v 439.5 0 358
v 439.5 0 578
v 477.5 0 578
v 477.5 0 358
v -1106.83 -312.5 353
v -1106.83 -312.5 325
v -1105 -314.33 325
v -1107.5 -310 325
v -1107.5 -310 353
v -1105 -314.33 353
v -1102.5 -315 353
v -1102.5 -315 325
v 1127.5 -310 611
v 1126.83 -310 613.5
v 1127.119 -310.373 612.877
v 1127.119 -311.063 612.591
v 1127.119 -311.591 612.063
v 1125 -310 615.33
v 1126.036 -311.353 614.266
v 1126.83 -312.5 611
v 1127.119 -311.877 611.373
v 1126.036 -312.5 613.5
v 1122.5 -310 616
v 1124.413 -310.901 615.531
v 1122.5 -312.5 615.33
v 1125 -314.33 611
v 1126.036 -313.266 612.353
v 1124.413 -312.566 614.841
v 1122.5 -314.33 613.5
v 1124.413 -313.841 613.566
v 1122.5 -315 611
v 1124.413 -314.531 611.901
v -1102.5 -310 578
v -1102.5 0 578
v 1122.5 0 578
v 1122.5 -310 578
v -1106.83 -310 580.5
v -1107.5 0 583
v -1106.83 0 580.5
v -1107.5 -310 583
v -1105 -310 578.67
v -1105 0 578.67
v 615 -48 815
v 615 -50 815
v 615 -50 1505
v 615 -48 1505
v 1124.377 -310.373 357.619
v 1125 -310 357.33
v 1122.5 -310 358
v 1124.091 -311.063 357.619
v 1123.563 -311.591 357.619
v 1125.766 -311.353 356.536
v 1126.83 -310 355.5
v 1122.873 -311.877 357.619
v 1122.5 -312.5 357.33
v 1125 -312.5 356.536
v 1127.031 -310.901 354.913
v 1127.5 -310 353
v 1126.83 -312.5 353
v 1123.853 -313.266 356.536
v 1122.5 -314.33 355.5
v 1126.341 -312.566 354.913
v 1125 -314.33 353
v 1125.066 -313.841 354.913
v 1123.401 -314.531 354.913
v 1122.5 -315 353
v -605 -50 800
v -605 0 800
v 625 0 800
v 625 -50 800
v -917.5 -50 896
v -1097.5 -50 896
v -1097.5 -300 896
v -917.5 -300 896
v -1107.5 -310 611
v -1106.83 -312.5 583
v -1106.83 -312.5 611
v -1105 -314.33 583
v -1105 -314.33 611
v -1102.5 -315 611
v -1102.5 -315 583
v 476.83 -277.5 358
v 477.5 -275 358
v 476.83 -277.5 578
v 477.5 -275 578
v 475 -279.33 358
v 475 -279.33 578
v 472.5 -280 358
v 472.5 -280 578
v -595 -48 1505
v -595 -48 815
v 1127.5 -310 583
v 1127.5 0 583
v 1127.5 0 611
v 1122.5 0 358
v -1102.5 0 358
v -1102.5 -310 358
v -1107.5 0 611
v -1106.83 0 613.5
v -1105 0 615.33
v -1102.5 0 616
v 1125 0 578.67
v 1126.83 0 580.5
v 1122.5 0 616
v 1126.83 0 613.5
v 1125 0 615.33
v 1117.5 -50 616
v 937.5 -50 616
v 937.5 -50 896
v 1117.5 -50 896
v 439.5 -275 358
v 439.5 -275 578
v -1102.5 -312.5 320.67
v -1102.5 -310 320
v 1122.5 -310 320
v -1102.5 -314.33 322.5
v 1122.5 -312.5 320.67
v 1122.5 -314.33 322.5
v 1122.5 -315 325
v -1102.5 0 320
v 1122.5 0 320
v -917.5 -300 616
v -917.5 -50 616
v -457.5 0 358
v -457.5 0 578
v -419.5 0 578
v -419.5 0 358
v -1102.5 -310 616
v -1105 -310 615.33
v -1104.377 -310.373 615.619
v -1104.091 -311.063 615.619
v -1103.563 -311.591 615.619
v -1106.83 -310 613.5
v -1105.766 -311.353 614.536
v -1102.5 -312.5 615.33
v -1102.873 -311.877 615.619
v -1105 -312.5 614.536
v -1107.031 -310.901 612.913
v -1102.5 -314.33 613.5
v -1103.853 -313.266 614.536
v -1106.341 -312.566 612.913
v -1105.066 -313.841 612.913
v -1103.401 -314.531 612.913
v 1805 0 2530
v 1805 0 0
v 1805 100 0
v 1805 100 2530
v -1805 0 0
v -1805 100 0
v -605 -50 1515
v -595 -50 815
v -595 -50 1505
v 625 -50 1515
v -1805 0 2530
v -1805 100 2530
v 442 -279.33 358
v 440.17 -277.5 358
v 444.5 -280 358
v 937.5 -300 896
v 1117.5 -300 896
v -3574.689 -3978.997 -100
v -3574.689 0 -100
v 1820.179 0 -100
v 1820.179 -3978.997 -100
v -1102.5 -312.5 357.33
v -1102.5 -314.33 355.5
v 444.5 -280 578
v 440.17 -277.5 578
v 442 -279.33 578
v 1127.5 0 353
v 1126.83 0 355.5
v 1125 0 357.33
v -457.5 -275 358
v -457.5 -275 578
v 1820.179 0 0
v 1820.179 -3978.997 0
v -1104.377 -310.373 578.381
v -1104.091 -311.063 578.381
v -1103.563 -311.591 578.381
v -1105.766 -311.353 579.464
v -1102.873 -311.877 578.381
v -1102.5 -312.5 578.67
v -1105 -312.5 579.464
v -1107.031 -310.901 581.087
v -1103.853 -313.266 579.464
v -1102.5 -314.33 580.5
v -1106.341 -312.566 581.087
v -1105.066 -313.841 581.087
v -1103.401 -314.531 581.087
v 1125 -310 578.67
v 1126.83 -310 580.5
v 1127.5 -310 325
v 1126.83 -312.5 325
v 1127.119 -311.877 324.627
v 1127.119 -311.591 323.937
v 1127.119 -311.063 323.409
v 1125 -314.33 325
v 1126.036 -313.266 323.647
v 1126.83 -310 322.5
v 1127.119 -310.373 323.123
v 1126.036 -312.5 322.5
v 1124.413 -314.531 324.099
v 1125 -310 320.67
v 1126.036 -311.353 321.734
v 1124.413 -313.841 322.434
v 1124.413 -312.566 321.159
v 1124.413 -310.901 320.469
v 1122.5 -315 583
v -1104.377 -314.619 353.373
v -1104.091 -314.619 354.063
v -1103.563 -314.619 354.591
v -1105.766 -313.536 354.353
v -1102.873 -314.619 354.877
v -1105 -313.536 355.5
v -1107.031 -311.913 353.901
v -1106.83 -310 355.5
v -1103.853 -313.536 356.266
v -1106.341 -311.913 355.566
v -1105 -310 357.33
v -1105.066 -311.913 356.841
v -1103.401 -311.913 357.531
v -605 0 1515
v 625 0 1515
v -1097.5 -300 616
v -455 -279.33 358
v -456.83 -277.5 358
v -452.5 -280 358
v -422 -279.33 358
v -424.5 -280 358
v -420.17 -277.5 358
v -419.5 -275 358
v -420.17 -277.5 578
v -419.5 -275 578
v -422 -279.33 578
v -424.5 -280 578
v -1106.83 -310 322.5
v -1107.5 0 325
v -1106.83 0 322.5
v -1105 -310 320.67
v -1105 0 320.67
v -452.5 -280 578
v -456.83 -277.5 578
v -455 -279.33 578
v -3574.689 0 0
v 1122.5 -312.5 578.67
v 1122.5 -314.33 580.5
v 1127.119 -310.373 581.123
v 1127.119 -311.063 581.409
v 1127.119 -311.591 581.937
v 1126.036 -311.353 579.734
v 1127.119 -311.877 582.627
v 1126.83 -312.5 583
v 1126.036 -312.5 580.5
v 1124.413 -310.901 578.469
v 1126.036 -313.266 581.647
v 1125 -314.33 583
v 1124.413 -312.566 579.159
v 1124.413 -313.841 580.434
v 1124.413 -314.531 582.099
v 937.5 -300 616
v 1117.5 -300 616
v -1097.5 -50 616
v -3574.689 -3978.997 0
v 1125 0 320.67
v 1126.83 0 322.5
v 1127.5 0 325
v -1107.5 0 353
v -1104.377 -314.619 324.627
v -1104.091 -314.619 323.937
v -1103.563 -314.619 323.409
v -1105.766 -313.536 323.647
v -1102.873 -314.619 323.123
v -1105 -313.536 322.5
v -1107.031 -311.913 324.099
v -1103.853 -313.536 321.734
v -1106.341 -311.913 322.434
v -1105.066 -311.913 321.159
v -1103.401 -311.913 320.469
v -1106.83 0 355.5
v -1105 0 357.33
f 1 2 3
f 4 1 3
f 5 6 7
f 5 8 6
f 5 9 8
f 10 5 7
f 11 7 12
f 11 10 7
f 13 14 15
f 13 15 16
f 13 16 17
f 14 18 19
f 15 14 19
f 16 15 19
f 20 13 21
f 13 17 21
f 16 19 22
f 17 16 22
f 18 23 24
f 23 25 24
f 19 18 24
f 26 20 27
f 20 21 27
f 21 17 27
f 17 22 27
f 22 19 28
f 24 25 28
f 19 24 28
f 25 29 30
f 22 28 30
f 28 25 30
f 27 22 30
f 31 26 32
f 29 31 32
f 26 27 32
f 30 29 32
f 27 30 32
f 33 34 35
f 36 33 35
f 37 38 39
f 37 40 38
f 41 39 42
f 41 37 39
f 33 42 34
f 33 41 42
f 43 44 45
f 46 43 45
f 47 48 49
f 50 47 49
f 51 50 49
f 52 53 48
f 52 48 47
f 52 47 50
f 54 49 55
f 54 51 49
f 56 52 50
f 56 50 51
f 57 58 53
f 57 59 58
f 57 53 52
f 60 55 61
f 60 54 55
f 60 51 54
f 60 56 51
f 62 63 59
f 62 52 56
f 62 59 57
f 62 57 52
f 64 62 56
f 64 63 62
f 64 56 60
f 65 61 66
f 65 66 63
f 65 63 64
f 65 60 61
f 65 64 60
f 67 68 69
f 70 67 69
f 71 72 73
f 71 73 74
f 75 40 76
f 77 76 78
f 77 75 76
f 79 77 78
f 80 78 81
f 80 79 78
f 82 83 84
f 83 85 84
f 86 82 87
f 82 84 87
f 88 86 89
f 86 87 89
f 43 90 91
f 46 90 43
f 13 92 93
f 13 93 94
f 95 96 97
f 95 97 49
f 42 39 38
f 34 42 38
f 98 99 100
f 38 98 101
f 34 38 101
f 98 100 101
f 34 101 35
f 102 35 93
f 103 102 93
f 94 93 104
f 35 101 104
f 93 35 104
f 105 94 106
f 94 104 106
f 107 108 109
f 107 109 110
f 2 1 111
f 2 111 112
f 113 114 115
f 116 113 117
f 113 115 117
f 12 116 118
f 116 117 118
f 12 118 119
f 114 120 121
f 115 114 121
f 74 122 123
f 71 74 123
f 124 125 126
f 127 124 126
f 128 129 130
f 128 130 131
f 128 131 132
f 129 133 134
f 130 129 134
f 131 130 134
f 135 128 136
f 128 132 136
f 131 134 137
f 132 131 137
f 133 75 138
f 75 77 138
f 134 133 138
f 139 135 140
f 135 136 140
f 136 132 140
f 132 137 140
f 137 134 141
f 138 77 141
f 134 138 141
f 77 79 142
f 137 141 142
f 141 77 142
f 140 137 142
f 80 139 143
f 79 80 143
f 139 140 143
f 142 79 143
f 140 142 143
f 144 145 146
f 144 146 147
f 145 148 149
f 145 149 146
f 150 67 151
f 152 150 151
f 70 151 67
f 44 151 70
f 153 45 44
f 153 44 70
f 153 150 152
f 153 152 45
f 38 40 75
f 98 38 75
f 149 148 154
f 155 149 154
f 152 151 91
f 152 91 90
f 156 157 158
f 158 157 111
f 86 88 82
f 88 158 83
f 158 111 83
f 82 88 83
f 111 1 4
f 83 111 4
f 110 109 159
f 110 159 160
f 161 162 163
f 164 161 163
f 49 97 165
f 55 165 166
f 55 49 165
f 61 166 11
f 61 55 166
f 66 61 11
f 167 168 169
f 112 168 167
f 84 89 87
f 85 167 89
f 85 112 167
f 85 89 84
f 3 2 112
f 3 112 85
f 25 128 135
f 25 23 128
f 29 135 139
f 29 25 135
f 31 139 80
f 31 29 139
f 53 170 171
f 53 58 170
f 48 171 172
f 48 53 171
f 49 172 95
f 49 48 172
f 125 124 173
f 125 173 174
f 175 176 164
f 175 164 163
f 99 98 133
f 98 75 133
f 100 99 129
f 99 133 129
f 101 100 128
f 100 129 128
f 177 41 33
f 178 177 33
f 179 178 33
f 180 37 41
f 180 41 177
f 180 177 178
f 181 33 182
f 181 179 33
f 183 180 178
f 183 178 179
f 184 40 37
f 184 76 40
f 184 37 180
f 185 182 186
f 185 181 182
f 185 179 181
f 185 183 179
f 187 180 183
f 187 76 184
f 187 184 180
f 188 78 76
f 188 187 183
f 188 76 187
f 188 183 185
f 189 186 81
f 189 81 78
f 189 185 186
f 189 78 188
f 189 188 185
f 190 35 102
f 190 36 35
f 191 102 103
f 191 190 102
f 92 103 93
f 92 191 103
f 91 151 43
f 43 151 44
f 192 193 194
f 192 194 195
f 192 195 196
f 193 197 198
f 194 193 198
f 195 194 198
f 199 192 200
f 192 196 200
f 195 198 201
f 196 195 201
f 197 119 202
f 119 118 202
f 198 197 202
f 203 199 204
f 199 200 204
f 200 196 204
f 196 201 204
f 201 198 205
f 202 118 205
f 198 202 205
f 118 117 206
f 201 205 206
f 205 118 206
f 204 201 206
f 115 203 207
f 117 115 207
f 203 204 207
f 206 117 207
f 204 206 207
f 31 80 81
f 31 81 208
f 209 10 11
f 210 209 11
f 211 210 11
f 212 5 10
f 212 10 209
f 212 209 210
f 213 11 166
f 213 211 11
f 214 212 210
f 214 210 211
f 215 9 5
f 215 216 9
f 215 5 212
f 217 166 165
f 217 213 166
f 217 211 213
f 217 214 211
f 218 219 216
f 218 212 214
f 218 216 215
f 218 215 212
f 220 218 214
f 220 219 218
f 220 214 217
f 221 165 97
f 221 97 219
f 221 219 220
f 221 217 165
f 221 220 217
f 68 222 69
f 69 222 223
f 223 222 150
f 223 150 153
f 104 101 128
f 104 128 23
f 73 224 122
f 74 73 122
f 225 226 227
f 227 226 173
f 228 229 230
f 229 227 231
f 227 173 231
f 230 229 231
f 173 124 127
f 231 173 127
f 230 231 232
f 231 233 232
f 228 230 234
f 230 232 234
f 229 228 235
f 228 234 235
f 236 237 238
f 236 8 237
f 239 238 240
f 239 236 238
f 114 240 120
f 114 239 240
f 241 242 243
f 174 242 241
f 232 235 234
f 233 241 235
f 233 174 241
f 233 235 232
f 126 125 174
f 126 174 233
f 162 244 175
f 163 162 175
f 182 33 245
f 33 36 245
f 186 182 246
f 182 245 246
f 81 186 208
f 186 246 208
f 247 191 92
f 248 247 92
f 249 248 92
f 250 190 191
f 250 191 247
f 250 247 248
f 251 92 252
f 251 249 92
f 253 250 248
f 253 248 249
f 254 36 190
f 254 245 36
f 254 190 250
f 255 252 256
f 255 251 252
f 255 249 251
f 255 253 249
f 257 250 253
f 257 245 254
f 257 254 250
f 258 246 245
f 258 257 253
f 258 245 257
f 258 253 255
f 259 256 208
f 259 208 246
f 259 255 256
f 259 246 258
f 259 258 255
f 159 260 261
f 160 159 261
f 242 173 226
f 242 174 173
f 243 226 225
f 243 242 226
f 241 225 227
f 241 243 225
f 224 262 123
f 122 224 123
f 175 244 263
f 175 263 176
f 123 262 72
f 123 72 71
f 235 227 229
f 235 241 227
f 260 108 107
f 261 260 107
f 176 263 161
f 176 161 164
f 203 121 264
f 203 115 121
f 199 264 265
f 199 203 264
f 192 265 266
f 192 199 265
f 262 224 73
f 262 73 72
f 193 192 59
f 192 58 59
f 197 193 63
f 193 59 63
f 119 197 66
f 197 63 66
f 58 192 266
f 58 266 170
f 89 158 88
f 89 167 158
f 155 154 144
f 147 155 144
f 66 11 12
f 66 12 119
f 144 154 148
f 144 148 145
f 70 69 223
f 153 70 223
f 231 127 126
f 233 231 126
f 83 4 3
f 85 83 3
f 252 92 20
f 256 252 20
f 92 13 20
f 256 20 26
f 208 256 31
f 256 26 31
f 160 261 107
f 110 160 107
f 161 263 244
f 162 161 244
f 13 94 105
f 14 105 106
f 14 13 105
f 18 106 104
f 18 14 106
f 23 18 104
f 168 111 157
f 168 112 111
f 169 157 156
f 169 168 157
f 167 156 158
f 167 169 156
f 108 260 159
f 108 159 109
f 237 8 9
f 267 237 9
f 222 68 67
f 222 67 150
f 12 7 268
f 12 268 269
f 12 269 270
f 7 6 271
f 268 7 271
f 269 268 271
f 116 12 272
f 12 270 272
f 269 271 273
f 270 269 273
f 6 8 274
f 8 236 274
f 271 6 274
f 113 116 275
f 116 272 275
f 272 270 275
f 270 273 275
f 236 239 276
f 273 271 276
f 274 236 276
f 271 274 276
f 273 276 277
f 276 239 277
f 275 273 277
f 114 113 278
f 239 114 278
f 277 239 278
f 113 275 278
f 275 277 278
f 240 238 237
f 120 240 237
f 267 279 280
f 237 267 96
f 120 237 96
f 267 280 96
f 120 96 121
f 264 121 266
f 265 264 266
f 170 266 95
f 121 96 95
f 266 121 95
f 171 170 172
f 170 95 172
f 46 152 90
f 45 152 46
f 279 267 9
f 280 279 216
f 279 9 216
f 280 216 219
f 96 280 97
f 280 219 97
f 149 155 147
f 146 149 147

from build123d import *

# Parameters (mm, degrees)
F0_W      = 3610
F0_H      = 2530
F1_DEPTH  = 100
F2_W      = 5394.8676586151
F2_H      = 3978.9967536926
F3_DEPTH  = 100
F4_W      = 1230
F4_H      = 715
F5_DEPTH  = 50
F6_W      = 1210
F6_H      = 690
F7_DEPTH  = 2
F8_W      = 2235
F8_H      = 38
F9_DEPTH  = 315
F10_W     = 38
F10_H     = 220
F11_DEPTH = 280
F12_R     = 5
F12_2_R   = 5
F13_R     = 5
F13_2_R   = 5
F14_W     = 180
F14_H     = 250
F15_DEPTH = 280


with BuildPart() as f1:
    # F0 (on Front) → F1 (new body)
    with BuildSketch(Plane.XZ):
        with Locations((0, 1265)):
            Rectangle(F0_W, F0_H)
    extrude(amount=-F1_DEPTH)


with BuildPart() as f3:
    # F2 (on Top) → F3 (new body)
    with BuildSketch(Plane.XY):
        with Locations((-877.255320549, -1989.4983768463)):
            Rectangle(F2_W, F2_H)
    extrude(amount=-F3_DEPTH)


with BuildPart() as f5:
    # F4 (on face) → F5 (new body)
    with BuildSketch(Plane.XZ):
        with Locations((10, 1157.5)):
            Rectangle(F4_W, F4_H)
    extrude(amount=F5_DEPTH)

    # F6 (on face) → F7 (cut)
    with BuildSketch(Plane.XZ.offset(50)):
        with Locations((10, 1160)):
            Rectangle(F6_W, F6_H)
    extrude(amount=-F7_DEPTH, mode=Mode.SUBTRACT)


with BuildPart() as f9:
    # F8 (on face) → F9 (new body)
    with BuildSketch(Plane.XZ):
        with Locations((10, 597)):
            Rectangle(F8_W, F8_H)
    extrude(amount=F9_DEPTH)

    # F12
    f12_edges = [f9.edges().sort_by_distance(p)[0] for p in [
        (-1107.5, -315, 597),
        (-1107.5, -157.5, 616),
        (-1107.5, -157.5, 578),
        (10, -315, 578),
        (10, -315, 616),
        (1127.5, -157.5, 616),
        (1127.5, -157.5, 578),
        (1127.5, -315, 597),
    ]]
    fillet(f12_edges, radius=F12_R)


with BuildPart() as f9b:
    # F8 (on face) → F9, piece 2 (new body)
    with BuildSketch(Plane.XZ):
        with Locations((10, 339)):
            Rectangle(F8_W, F8_H)
    extrude(amount=F9_DEPTH)

    # F12#2
    f12_2_edges = [f9b.edges().sort_by_distance(p)[0] for p in [
        (-1107.5, -157.5, 358),
        (-1107.5, -157.5, 320),
        (-1107.5, -315, 339),
        (10, -315, 320),
        (1127.5, -315, 339),
        (1127.5, -157.5, 320),
        (1127.5, -157.5, 358),
        (10, -315, 358),
    ]]
    fillet(f12_2_edges, radius=F12_2_R)


with BuildPart() as f11:
    # F10 (on face) → F11 (new body)
    with BuildSketch(Plane.XZ):
        with Locations((-438.5, 468)):
            Rectangle(F10_W, F10_H)
    extrude(amount=F11_DEPTH)

    # F13
    f13_edges = [f11.edges().sort_by_distance(p)[0] for p in [
        (-457.5, -280, 468),
        (-419.5, -280, 468),
    ]]
    fillet(f13_edges, radius=F13_R)


with BuildPart() as f11b:
    # F10 (on face) → F11, piece 2 (new body)
    with BuildSketch(Plane.XZ):
        with Locations((458.5, 468)):
            Rectangle(F10_W, F10_H)
    extrude(amount=F11_DEPTH)

    # F13#2
    f13_2_edges = [f11b.edges().sort_by_distance(p)[0] for p in [
        (439.5, -280, 468),
        (477.5, -280, 468),
    ]]
    fillet(f13_2_edges, radius=F13_2_R)


with BuildPart() as f15:
    # F14 (on face) → F15 (new body)
    with BuildSketch(Plane.XY.offset(616)):
        with Locations((-1007.5, -175)):
            Rectangle(F14_W, F14_H)
    extrude(amount=F15_DEPTH)


with BuildPart() as f15b:
    # F14 (on face) → F15, piece 2 (new body)
    with BuildSketch(Plane.XY.offset(616)):
        with Locations((1027.5, -175)):
            Rectangle(F14_W, F14_H)
    extrude(amount=F15_DEPTH)


solid = Compound([f1.part, f3.part, f5.part, f9.part, f9b.part, f11.part, f11b.part, f15.part, f15b.part])
